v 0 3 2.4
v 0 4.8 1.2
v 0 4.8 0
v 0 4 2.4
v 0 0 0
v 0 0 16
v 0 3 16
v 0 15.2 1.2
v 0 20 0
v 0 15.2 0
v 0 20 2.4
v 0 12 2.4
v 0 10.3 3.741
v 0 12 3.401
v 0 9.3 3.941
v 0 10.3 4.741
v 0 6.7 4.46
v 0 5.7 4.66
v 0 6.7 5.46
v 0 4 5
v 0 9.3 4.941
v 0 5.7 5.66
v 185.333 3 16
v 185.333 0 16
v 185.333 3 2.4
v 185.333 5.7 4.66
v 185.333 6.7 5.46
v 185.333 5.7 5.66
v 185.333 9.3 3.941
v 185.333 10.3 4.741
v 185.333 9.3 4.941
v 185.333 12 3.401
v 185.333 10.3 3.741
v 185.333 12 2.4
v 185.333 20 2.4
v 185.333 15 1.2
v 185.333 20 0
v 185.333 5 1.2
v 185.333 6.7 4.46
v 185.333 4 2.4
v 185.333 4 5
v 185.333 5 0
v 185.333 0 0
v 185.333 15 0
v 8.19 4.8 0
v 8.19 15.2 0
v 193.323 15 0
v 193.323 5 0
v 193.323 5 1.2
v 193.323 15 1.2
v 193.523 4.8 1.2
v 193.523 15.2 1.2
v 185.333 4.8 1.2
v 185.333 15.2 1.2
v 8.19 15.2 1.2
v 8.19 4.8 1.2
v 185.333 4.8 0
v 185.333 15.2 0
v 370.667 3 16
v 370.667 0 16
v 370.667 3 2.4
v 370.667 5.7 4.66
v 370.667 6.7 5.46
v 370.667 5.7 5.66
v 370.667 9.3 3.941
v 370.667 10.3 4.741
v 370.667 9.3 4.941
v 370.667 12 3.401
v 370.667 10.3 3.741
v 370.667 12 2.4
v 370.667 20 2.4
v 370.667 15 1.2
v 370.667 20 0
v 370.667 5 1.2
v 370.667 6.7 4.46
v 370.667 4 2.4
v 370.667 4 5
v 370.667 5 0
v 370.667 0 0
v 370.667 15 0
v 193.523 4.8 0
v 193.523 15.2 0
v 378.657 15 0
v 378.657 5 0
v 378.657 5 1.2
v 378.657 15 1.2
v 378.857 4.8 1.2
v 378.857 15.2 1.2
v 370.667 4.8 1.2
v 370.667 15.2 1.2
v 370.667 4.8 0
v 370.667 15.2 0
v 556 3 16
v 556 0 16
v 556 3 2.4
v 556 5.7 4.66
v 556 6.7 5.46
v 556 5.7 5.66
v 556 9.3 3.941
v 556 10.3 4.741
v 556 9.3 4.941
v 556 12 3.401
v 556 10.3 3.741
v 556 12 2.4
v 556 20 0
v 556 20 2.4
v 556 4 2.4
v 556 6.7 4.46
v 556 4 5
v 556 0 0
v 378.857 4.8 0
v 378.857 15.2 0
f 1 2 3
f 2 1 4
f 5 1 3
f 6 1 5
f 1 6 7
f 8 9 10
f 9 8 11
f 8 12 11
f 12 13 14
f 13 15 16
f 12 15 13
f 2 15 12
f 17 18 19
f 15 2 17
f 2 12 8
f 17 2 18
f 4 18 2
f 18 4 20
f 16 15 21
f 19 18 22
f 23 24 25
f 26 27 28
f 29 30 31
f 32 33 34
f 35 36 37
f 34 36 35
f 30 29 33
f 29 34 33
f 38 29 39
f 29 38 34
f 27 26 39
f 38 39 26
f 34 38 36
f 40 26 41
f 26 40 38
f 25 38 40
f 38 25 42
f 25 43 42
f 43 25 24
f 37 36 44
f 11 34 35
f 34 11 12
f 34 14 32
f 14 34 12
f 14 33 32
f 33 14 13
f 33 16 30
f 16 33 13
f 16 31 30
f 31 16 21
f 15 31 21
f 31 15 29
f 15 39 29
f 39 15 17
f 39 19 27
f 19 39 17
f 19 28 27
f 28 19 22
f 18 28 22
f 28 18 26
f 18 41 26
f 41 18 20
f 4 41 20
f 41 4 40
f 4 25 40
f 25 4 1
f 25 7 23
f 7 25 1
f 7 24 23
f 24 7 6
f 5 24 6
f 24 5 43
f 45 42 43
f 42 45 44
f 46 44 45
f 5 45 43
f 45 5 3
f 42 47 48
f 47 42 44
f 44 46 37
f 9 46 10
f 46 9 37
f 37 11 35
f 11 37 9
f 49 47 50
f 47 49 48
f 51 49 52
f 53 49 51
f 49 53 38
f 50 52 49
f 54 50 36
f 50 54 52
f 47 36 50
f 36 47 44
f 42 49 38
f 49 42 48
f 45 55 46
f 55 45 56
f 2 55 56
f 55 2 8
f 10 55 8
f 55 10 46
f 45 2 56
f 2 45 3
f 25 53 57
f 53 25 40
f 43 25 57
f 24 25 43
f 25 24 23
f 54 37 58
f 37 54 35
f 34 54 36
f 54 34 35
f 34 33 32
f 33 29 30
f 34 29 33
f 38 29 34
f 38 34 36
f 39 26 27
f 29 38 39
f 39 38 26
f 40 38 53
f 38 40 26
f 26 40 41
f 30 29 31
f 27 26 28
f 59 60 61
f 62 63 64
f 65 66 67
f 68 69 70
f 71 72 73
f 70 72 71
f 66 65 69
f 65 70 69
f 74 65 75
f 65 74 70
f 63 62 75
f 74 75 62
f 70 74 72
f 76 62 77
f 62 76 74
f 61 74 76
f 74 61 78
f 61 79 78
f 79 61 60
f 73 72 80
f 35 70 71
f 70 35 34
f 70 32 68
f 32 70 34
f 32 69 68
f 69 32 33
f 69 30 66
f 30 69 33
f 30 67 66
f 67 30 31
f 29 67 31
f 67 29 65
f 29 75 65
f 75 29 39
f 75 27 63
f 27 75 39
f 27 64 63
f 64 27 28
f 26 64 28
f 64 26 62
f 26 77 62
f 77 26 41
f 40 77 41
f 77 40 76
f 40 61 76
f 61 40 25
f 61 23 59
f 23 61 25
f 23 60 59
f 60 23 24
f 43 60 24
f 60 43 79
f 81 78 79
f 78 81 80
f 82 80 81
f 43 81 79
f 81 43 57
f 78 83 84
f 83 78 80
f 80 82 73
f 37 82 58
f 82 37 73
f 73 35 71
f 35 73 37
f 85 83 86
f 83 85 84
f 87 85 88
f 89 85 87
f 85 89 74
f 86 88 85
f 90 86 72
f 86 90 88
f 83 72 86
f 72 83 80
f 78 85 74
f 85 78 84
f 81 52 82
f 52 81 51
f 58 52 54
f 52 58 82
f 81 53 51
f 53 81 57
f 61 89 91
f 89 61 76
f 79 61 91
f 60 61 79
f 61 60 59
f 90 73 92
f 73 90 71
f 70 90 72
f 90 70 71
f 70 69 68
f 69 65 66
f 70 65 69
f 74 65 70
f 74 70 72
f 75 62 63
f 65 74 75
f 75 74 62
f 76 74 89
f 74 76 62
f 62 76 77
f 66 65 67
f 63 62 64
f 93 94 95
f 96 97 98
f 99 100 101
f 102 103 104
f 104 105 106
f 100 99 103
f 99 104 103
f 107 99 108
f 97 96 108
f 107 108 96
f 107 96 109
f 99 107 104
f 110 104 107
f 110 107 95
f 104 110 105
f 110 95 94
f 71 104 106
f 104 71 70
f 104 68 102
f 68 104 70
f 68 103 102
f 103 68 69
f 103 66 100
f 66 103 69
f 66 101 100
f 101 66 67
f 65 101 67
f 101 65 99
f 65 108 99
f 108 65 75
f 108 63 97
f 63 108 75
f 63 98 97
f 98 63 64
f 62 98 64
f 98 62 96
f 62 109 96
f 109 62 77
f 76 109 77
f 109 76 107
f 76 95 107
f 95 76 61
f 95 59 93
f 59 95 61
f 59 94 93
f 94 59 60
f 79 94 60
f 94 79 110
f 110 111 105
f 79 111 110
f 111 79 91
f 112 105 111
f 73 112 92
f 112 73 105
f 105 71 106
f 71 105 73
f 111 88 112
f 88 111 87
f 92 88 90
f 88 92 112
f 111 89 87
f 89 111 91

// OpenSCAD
// LED strip guide for the crystal cabinet: a shallow channel taped to the
// underside of a shelf/top panel, just behind the front edge. The strip sits
// on a seat tilted toward the back of the cabinet; a front fascia hides it.
//
// Two runs (cabinet top and mid shelf), each 3 pieces: 2 x guide + 1 x
// guide-end. Print with the tape face on the bed; no supports.

// parts: guide guide-end

part = "run"; // [run, guide, guide-end]

/* [Cabinet] */
inner_w = 560;         // mm, clear width between the side panels
side_clear = 2;        // mm, gap at each end
pieces = 3;            // pieces per run

/* [Profile] */
depth = 20;            // mm, front to back
plate_t = 2.4;         // mm, thickness of the plate that takes the tape
fascia_t = 3;          // mm
drop = 16;             // mm, how far the fascia hangs below the panel

/* [Strip seat] */
seat_front = 4;        // mm from the front face
seat_len = 8;          // mm, length of the seat along the profile
seat_tilt = 11.3;      // deg, aims the strip down and toward the back
seat_z = 5;            // mm below the panel at seat_front
strip_w = 2;           // mm
strip_clear = 0.6;     // mm, total clearance across the strip
rib = [1, 1];          // mm, [width, height] of the retaining ribs

/* [Splice] */
tongue_len = 8;        // mm
tongue_t = 1.2;        // mm, on the tape-face side so it prints flat
tongue_y = [5, 15];    // mm, span across the profile
tongue_fit = 0.2;      // mm, clearance per side

$fa = 2;
$fs = 0.4;

run_len = inner_w - 2 * side_clear;
piece_len = run_len / pieces;
seat_back = seat_front + seat_len;
seat_back_z = seat_z - seat_len * tan(seat_tilt);
strip_gap = strip_w + strip_clear;
seat_mid = seat_front + seat_len / 2;

// Above this angle from horizontal, a viewer below cannot see the strip past
// the fascia. Their eye line to the top shelf is ~48 degrees.
hide_angle = atan((drop - seat_z_at(seat_mid)) / (seat_mid - fascia_t));

assert(piece_len + tongue_len <= 245, "piece too long for the P1S bed");
assert(seat_back_z > plate_t, "seat runs into the plate; shorten seat_len");
assert(hide_angle >= 60, "fascia too shallow to hide the strip at 48 degrees");
echo(str("strip hidden above ", hide_angle, " deg from horizontal"));

function seat_z_at(y) = seat_z - (y - seat_front) * tan(seat_tilt);

// Cross-section in (y, z): y from the front face back, z down from the panel.
function profile() = concat(
    [[0, 0], [depth, 0], [depth, plate_t], [seat_back, plate_t],
     [seat_back, seat_back_z]],
    rib_points(),
    [[seat_front, seat_z], [seat_front, plate_t], [fascia_t, plate_t],
     [fascia_t, drop], [0, drop]]
);

// Ribs either side of the strip channel, walking front-ward along the seat.
function rib_points() = let (
    inner_b = seat_mid + strip_gap / 2,
    outer_b = inner_b + rib[0],
    inner_f = seat_mid - strip_gap / 2,
    outer_f = inner_f - rib[0]
) [
    [outer_b, seat_z_at(outer_b)],
    [outer_b, seat_z_at(outer_b) + rib[1]],
    [inner_b, seat_z_at(inner_b) + rib[1]],
    [inner_b, seat_z_at(inner_b)],
    [inner_f, seat_z_at(inner_f)],
    [inner_f, seat_z_at(inner_f) + rib[1]],
    [outer_f, seat_z_at(outer_f) + rib[1]],
    [outer_f, seat_z_at(outer_f)],
];

module body(len) {
    rotate([90, 0, 90]) linear_extrude(len) polygon(profile());
}

module tongue(c = 0) {
    translate([-0.01, tongue_y[0] - c, -c])
        cube([tongue_len + c, tongue_y[1] - tongue_y[0] + 2 * c, tongue_t + c]);
}

// A piece with a slot at x = 0; `with_tongue` adds the tongue at the far end.
module piece(with_tongue) {
    difference() {
        union() {
            body(piece_len);
            if (with_tongue) translate([piece_len, 0, 0]) tongue();
        }
        tongue(tongue_fit);
    }
}

module run() {
    for (i = [0 : pieces - 1])
        translate([i * piece_len, 0, 0]) color(i % 2 ? "LightSteelBlue" : "SteelBlue")
            piece(i < pieces - 1);
}

if (part == "run") run();
else piece(part == "guide");
